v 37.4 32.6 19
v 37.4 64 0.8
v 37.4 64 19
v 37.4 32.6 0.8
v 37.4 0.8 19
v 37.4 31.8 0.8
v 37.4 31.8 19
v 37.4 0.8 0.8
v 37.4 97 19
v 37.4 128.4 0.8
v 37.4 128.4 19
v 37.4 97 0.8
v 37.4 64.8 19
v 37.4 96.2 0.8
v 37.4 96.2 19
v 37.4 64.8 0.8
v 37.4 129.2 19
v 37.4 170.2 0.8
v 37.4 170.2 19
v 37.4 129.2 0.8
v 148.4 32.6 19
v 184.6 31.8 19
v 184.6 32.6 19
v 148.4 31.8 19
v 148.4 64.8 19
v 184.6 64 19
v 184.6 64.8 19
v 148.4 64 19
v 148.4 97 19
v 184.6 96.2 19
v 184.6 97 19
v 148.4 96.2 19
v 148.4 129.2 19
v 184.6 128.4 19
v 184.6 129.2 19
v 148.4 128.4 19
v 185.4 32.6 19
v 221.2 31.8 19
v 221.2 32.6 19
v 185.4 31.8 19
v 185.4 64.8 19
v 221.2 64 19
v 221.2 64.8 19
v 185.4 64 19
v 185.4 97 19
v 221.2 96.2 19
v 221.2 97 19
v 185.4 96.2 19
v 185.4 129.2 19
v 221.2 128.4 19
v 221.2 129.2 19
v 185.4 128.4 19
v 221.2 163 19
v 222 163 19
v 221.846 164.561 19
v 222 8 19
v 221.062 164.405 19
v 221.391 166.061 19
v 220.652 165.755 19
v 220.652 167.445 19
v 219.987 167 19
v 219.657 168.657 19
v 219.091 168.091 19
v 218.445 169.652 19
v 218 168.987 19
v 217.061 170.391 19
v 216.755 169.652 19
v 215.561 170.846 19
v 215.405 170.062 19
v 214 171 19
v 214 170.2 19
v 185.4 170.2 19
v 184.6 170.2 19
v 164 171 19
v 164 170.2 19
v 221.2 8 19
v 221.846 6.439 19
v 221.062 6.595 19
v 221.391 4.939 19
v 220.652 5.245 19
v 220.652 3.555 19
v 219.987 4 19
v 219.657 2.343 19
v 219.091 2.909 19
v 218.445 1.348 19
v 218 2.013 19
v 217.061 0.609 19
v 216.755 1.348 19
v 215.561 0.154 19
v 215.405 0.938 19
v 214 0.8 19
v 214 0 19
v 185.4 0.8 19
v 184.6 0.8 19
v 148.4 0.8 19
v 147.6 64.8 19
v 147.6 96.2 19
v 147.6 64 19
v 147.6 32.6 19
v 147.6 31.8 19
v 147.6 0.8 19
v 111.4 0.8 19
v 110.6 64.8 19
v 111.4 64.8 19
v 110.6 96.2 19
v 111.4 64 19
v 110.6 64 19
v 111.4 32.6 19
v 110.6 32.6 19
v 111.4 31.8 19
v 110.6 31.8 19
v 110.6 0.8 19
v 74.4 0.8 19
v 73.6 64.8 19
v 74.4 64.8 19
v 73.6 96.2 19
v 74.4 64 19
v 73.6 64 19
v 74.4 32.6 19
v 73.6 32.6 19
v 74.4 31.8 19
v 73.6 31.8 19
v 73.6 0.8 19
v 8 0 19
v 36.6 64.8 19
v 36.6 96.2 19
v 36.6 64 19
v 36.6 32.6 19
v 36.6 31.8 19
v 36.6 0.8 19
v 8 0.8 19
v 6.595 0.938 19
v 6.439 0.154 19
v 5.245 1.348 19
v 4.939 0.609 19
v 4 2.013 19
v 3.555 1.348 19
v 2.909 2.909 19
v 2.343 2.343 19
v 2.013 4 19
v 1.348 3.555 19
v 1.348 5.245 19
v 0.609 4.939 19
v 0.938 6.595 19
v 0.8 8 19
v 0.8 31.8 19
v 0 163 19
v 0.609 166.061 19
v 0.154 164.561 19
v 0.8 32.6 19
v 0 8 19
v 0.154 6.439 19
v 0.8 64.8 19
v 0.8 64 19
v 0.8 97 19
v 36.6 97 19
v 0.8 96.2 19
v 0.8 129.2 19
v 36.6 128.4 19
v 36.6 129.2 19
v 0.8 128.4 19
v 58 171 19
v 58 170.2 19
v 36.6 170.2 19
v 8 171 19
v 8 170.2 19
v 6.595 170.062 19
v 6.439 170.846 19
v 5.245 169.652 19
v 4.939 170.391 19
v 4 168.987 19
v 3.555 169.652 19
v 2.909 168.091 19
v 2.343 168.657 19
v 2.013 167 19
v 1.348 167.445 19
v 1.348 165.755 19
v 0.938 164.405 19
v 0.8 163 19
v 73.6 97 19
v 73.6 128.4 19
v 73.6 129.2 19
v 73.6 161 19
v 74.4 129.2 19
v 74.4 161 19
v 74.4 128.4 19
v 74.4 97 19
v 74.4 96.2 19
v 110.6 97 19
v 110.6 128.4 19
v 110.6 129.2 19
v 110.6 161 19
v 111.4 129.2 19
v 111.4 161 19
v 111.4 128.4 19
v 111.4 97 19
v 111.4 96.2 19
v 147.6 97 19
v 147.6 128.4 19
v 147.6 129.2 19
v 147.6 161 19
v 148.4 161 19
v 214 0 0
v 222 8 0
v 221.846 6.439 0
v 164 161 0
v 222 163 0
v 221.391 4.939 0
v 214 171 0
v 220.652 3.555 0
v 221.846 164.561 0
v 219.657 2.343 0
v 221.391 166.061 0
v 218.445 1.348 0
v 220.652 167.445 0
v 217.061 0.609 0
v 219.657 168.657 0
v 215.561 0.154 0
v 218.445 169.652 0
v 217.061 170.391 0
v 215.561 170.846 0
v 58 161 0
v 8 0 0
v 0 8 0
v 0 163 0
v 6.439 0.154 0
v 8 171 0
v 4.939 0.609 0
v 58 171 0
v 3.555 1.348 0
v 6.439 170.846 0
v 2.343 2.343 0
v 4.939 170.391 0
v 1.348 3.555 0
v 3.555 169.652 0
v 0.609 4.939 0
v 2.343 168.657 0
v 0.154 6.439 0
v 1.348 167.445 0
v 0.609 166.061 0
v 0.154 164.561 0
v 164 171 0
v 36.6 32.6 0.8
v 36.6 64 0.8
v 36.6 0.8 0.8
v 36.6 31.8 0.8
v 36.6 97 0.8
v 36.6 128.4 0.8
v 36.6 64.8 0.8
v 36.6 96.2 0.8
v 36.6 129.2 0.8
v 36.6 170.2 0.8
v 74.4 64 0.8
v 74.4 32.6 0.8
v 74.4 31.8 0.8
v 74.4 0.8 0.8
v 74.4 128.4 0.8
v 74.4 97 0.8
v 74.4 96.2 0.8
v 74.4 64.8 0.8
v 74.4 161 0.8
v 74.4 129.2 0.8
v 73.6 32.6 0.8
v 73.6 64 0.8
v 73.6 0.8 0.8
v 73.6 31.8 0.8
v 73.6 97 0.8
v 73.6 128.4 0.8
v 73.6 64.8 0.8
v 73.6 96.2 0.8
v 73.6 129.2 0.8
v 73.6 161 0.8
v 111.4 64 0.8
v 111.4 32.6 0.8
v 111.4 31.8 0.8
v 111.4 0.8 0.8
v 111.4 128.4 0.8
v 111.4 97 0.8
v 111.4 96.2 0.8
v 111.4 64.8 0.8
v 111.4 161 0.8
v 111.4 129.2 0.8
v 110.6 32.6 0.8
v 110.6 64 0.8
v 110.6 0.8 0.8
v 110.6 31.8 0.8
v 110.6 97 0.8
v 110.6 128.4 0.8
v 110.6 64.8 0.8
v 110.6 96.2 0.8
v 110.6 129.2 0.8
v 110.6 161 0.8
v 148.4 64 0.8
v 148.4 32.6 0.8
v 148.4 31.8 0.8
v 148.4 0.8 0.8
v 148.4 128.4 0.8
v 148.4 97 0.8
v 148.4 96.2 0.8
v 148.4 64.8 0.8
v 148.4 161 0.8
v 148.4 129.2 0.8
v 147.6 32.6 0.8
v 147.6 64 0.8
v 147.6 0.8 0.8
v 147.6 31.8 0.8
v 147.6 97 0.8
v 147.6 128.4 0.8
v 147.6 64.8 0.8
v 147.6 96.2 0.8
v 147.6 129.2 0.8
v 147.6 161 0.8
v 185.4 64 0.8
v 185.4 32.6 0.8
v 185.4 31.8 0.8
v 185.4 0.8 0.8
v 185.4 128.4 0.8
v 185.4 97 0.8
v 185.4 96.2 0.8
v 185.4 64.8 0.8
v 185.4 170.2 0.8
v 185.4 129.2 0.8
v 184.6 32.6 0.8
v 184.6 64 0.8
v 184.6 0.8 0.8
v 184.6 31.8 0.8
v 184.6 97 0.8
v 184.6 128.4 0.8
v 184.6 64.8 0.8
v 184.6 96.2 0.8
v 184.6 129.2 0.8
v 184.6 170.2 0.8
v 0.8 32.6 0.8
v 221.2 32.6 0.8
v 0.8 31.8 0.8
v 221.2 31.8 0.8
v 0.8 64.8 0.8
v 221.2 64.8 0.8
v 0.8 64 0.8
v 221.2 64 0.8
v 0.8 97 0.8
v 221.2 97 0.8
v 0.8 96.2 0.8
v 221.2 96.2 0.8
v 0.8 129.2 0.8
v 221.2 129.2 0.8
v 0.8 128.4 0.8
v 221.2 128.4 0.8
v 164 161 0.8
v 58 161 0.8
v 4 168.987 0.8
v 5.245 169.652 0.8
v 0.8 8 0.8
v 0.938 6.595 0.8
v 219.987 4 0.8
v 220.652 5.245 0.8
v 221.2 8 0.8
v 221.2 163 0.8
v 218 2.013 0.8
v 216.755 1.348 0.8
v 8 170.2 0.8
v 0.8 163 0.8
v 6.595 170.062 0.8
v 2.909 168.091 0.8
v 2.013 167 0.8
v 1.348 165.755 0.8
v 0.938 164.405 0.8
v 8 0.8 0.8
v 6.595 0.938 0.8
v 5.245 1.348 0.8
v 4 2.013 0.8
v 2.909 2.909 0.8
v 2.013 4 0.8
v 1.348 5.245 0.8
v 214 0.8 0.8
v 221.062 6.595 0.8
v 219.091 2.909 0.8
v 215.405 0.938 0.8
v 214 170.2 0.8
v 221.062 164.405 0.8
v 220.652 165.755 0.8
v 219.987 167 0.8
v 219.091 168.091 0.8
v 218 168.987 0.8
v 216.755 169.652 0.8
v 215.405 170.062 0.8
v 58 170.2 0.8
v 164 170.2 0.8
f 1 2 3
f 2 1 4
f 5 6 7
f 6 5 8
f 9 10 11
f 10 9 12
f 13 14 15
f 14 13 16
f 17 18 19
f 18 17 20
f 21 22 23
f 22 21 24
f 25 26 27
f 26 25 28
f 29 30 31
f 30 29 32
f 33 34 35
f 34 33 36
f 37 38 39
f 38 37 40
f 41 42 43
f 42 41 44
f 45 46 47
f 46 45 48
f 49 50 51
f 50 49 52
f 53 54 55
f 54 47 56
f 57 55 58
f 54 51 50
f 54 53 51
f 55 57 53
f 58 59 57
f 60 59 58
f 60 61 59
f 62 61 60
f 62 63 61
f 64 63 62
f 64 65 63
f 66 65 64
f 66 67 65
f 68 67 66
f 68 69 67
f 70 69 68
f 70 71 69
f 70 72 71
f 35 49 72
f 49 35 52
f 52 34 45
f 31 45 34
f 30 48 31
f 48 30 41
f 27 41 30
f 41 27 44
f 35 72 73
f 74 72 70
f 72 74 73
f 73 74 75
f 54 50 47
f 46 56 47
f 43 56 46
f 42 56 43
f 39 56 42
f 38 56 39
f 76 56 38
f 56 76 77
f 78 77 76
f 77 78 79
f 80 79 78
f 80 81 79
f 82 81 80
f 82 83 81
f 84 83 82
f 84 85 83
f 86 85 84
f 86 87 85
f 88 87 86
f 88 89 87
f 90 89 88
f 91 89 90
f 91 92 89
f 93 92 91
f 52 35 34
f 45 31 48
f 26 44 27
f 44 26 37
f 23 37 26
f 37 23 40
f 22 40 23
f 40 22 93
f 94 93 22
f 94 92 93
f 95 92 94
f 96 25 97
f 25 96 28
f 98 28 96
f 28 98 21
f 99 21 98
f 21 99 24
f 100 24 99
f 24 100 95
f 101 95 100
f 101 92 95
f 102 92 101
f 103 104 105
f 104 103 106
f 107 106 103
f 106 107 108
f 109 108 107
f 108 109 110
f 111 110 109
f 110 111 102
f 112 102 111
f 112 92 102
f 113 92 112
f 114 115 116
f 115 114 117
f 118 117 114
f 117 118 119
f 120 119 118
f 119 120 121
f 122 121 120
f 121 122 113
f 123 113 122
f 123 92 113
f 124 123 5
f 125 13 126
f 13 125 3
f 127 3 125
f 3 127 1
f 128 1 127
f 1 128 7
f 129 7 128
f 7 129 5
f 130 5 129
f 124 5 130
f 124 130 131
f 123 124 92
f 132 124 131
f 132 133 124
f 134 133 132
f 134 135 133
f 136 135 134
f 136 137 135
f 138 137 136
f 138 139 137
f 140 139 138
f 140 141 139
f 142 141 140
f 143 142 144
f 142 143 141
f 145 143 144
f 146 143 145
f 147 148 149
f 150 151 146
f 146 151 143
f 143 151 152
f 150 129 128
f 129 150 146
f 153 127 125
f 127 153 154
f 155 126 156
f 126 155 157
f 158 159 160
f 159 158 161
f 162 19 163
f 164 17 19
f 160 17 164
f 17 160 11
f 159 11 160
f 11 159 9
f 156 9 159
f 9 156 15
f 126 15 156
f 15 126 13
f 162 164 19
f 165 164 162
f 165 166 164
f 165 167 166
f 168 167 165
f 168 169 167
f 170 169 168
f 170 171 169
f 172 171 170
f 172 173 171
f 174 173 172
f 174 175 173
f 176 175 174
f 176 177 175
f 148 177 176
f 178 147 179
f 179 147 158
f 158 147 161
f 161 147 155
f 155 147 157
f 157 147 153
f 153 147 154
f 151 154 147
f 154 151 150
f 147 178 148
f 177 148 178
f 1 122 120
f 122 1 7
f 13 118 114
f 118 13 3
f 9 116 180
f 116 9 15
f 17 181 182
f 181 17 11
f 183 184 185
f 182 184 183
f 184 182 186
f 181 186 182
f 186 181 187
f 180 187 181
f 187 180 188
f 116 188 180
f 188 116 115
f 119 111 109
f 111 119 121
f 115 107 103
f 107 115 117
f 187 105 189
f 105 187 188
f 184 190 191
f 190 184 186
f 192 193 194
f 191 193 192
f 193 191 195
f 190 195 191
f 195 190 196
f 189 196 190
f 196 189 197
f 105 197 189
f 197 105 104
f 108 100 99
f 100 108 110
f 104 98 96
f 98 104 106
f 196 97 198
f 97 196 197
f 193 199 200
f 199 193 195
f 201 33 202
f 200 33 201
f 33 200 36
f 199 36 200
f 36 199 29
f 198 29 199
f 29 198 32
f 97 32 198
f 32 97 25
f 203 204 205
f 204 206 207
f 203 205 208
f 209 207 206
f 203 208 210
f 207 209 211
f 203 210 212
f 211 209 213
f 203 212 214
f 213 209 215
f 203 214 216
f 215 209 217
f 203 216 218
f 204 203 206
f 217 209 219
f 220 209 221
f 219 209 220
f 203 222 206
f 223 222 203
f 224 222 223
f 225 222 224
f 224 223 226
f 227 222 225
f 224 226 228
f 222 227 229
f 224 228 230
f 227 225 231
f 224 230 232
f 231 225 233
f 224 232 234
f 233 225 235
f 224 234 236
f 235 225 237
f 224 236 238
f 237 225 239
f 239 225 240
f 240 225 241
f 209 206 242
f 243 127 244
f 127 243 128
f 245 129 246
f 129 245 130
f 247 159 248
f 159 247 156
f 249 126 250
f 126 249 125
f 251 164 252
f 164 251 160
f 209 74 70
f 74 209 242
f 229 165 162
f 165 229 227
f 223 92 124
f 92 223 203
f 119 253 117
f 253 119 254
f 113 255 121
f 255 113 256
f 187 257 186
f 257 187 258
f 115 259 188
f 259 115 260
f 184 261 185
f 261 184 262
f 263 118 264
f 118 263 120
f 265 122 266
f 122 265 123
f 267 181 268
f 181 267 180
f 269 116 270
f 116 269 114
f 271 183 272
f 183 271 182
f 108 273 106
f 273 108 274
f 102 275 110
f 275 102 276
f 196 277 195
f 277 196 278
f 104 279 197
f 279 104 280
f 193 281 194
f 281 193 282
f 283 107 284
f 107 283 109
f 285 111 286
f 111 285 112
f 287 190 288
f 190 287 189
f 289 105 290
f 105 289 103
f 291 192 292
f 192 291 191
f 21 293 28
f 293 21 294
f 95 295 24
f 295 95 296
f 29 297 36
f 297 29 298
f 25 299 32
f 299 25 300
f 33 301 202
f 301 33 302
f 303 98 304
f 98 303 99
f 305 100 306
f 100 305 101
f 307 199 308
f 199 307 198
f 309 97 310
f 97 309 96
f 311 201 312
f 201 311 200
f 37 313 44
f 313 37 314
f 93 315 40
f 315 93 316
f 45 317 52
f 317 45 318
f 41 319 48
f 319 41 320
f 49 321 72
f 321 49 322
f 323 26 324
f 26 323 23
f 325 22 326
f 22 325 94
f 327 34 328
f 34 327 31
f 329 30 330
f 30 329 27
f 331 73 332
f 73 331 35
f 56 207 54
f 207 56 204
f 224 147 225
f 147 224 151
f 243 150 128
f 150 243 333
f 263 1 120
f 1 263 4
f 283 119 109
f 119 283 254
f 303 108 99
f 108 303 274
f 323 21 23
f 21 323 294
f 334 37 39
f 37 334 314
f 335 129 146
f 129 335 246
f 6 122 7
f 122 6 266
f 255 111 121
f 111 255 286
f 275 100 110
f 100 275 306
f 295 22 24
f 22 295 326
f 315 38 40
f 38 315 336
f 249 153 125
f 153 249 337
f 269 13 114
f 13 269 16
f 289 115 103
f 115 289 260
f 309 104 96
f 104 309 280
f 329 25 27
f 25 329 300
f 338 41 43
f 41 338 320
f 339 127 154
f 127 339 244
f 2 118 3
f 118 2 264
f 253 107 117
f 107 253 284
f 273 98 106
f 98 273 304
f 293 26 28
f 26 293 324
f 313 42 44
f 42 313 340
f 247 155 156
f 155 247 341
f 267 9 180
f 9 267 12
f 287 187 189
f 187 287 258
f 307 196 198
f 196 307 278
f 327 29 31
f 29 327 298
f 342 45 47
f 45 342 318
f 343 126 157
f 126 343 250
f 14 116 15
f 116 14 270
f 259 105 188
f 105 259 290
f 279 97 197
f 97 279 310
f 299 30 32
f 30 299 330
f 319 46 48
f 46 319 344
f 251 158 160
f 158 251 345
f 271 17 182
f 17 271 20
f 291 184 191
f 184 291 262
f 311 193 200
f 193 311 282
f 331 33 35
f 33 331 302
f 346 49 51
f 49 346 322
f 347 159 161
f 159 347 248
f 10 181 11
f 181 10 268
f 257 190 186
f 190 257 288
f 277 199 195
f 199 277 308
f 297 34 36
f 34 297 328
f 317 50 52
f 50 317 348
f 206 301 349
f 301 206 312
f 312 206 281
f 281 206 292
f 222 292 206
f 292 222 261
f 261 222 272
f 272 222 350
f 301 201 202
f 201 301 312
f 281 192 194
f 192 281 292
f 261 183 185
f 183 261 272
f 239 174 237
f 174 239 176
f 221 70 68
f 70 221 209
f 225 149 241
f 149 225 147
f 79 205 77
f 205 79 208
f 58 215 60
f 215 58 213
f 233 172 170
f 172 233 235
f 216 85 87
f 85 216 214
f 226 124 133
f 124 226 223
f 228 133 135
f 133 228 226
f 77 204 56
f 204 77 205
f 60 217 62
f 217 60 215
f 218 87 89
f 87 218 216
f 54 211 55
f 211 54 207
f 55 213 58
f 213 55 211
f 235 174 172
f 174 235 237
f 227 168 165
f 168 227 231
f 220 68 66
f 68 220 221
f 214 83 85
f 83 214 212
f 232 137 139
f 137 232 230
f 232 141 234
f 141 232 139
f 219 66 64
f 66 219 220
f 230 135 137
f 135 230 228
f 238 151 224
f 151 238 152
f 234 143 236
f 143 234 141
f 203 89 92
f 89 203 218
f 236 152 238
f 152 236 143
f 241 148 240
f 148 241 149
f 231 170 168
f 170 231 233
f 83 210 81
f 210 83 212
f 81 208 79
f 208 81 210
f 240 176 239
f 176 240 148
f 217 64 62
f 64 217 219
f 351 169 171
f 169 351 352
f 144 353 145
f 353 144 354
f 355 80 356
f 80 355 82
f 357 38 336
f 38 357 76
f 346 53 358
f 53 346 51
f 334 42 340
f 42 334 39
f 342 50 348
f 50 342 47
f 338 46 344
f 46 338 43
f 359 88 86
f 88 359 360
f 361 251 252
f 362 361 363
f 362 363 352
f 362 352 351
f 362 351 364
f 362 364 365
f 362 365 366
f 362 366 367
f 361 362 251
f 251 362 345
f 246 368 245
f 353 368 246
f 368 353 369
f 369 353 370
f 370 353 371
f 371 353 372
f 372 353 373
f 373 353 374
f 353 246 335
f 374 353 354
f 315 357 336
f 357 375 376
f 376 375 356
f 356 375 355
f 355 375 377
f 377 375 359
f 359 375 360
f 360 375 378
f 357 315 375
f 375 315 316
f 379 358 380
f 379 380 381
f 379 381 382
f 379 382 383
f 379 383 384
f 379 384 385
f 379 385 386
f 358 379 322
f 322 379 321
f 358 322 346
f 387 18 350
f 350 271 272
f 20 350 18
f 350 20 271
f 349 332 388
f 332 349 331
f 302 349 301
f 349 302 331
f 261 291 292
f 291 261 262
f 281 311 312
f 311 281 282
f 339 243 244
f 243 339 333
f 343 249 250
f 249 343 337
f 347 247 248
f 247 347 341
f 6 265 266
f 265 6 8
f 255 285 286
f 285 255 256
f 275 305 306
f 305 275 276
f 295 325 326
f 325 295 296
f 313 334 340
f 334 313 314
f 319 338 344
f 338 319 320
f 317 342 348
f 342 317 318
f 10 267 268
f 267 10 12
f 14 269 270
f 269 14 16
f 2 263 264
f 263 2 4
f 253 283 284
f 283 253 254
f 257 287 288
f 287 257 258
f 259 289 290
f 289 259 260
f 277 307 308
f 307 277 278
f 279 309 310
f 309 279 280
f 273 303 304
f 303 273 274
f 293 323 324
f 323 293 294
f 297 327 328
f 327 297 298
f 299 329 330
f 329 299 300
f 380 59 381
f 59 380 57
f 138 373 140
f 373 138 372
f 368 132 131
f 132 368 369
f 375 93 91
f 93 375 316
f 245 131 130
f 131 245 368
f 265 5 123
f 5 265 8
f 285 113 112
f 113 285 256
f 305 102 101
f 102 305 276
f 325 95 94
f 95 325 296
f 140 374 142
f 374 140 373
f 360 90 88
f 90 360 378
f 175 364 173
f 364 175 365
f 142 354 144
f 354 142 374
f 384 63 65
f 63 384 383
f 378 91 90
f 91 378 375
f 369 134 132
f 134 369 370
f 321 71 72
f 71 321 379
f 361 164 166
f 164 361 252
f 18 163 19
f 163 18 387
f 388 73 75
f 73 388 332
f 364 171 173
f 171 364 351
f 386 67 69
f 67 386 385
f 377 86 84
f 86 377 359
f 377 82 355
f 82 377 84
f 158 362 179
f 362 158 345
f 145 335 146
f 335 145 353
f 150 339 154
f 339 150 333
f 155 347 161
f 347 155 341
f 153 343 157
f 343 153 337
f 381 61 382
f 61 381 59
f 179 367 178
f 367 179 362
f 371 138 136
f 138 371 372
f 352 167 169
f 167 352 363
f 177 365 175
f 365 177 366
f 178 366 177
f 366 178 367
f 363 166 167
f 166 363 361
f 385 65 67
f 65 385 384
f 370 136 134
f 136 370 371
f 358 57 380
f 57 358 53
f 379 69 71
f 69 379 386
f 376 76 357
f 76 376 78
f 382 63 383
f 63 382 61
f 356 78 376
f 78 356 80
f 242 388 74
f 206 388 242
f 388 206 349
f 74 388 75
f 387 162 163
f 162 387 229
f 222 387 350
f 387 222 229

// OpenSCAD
thick = 0.8;
W = 222;
D = 171;
H = 19;
R = 8;
latchW = 104;
latchD = 10;

difference() {
    union() {
        //cube([W, D, 1]);
        for (i = [1:5])
            translate([W / 6 * i - thick / 2, 0, 0])
                cube([thick, D, H]);
        for (i = [1:4])
            translate([0, (D - 10) / 5 * i - thick / 2, 0])
                cube([W, thick, H]);
    }
    translate([(W - latchW) / 2, D - latchD, 0])
        cube([latchW, latchD, H]);
}

difference() {
    hull() {
        for (x = [R, W - R])
            for (y = [R, D - R])
                translate([x, y, 0])
                    cylinder(r = R, h = H, $fn = 32);
    }
    hull() {
        for (x = [R, W - R])
            for (y = [R, D - R])
                translate([x, y, thick])
                    cylinder(r = R - thick, h = H - thick, $fn = 32);
    }
    translate([(W - latchW) / 2 - 1, D - latchD, 0])
        cube([latchW + 2, latchD, H]);
}
